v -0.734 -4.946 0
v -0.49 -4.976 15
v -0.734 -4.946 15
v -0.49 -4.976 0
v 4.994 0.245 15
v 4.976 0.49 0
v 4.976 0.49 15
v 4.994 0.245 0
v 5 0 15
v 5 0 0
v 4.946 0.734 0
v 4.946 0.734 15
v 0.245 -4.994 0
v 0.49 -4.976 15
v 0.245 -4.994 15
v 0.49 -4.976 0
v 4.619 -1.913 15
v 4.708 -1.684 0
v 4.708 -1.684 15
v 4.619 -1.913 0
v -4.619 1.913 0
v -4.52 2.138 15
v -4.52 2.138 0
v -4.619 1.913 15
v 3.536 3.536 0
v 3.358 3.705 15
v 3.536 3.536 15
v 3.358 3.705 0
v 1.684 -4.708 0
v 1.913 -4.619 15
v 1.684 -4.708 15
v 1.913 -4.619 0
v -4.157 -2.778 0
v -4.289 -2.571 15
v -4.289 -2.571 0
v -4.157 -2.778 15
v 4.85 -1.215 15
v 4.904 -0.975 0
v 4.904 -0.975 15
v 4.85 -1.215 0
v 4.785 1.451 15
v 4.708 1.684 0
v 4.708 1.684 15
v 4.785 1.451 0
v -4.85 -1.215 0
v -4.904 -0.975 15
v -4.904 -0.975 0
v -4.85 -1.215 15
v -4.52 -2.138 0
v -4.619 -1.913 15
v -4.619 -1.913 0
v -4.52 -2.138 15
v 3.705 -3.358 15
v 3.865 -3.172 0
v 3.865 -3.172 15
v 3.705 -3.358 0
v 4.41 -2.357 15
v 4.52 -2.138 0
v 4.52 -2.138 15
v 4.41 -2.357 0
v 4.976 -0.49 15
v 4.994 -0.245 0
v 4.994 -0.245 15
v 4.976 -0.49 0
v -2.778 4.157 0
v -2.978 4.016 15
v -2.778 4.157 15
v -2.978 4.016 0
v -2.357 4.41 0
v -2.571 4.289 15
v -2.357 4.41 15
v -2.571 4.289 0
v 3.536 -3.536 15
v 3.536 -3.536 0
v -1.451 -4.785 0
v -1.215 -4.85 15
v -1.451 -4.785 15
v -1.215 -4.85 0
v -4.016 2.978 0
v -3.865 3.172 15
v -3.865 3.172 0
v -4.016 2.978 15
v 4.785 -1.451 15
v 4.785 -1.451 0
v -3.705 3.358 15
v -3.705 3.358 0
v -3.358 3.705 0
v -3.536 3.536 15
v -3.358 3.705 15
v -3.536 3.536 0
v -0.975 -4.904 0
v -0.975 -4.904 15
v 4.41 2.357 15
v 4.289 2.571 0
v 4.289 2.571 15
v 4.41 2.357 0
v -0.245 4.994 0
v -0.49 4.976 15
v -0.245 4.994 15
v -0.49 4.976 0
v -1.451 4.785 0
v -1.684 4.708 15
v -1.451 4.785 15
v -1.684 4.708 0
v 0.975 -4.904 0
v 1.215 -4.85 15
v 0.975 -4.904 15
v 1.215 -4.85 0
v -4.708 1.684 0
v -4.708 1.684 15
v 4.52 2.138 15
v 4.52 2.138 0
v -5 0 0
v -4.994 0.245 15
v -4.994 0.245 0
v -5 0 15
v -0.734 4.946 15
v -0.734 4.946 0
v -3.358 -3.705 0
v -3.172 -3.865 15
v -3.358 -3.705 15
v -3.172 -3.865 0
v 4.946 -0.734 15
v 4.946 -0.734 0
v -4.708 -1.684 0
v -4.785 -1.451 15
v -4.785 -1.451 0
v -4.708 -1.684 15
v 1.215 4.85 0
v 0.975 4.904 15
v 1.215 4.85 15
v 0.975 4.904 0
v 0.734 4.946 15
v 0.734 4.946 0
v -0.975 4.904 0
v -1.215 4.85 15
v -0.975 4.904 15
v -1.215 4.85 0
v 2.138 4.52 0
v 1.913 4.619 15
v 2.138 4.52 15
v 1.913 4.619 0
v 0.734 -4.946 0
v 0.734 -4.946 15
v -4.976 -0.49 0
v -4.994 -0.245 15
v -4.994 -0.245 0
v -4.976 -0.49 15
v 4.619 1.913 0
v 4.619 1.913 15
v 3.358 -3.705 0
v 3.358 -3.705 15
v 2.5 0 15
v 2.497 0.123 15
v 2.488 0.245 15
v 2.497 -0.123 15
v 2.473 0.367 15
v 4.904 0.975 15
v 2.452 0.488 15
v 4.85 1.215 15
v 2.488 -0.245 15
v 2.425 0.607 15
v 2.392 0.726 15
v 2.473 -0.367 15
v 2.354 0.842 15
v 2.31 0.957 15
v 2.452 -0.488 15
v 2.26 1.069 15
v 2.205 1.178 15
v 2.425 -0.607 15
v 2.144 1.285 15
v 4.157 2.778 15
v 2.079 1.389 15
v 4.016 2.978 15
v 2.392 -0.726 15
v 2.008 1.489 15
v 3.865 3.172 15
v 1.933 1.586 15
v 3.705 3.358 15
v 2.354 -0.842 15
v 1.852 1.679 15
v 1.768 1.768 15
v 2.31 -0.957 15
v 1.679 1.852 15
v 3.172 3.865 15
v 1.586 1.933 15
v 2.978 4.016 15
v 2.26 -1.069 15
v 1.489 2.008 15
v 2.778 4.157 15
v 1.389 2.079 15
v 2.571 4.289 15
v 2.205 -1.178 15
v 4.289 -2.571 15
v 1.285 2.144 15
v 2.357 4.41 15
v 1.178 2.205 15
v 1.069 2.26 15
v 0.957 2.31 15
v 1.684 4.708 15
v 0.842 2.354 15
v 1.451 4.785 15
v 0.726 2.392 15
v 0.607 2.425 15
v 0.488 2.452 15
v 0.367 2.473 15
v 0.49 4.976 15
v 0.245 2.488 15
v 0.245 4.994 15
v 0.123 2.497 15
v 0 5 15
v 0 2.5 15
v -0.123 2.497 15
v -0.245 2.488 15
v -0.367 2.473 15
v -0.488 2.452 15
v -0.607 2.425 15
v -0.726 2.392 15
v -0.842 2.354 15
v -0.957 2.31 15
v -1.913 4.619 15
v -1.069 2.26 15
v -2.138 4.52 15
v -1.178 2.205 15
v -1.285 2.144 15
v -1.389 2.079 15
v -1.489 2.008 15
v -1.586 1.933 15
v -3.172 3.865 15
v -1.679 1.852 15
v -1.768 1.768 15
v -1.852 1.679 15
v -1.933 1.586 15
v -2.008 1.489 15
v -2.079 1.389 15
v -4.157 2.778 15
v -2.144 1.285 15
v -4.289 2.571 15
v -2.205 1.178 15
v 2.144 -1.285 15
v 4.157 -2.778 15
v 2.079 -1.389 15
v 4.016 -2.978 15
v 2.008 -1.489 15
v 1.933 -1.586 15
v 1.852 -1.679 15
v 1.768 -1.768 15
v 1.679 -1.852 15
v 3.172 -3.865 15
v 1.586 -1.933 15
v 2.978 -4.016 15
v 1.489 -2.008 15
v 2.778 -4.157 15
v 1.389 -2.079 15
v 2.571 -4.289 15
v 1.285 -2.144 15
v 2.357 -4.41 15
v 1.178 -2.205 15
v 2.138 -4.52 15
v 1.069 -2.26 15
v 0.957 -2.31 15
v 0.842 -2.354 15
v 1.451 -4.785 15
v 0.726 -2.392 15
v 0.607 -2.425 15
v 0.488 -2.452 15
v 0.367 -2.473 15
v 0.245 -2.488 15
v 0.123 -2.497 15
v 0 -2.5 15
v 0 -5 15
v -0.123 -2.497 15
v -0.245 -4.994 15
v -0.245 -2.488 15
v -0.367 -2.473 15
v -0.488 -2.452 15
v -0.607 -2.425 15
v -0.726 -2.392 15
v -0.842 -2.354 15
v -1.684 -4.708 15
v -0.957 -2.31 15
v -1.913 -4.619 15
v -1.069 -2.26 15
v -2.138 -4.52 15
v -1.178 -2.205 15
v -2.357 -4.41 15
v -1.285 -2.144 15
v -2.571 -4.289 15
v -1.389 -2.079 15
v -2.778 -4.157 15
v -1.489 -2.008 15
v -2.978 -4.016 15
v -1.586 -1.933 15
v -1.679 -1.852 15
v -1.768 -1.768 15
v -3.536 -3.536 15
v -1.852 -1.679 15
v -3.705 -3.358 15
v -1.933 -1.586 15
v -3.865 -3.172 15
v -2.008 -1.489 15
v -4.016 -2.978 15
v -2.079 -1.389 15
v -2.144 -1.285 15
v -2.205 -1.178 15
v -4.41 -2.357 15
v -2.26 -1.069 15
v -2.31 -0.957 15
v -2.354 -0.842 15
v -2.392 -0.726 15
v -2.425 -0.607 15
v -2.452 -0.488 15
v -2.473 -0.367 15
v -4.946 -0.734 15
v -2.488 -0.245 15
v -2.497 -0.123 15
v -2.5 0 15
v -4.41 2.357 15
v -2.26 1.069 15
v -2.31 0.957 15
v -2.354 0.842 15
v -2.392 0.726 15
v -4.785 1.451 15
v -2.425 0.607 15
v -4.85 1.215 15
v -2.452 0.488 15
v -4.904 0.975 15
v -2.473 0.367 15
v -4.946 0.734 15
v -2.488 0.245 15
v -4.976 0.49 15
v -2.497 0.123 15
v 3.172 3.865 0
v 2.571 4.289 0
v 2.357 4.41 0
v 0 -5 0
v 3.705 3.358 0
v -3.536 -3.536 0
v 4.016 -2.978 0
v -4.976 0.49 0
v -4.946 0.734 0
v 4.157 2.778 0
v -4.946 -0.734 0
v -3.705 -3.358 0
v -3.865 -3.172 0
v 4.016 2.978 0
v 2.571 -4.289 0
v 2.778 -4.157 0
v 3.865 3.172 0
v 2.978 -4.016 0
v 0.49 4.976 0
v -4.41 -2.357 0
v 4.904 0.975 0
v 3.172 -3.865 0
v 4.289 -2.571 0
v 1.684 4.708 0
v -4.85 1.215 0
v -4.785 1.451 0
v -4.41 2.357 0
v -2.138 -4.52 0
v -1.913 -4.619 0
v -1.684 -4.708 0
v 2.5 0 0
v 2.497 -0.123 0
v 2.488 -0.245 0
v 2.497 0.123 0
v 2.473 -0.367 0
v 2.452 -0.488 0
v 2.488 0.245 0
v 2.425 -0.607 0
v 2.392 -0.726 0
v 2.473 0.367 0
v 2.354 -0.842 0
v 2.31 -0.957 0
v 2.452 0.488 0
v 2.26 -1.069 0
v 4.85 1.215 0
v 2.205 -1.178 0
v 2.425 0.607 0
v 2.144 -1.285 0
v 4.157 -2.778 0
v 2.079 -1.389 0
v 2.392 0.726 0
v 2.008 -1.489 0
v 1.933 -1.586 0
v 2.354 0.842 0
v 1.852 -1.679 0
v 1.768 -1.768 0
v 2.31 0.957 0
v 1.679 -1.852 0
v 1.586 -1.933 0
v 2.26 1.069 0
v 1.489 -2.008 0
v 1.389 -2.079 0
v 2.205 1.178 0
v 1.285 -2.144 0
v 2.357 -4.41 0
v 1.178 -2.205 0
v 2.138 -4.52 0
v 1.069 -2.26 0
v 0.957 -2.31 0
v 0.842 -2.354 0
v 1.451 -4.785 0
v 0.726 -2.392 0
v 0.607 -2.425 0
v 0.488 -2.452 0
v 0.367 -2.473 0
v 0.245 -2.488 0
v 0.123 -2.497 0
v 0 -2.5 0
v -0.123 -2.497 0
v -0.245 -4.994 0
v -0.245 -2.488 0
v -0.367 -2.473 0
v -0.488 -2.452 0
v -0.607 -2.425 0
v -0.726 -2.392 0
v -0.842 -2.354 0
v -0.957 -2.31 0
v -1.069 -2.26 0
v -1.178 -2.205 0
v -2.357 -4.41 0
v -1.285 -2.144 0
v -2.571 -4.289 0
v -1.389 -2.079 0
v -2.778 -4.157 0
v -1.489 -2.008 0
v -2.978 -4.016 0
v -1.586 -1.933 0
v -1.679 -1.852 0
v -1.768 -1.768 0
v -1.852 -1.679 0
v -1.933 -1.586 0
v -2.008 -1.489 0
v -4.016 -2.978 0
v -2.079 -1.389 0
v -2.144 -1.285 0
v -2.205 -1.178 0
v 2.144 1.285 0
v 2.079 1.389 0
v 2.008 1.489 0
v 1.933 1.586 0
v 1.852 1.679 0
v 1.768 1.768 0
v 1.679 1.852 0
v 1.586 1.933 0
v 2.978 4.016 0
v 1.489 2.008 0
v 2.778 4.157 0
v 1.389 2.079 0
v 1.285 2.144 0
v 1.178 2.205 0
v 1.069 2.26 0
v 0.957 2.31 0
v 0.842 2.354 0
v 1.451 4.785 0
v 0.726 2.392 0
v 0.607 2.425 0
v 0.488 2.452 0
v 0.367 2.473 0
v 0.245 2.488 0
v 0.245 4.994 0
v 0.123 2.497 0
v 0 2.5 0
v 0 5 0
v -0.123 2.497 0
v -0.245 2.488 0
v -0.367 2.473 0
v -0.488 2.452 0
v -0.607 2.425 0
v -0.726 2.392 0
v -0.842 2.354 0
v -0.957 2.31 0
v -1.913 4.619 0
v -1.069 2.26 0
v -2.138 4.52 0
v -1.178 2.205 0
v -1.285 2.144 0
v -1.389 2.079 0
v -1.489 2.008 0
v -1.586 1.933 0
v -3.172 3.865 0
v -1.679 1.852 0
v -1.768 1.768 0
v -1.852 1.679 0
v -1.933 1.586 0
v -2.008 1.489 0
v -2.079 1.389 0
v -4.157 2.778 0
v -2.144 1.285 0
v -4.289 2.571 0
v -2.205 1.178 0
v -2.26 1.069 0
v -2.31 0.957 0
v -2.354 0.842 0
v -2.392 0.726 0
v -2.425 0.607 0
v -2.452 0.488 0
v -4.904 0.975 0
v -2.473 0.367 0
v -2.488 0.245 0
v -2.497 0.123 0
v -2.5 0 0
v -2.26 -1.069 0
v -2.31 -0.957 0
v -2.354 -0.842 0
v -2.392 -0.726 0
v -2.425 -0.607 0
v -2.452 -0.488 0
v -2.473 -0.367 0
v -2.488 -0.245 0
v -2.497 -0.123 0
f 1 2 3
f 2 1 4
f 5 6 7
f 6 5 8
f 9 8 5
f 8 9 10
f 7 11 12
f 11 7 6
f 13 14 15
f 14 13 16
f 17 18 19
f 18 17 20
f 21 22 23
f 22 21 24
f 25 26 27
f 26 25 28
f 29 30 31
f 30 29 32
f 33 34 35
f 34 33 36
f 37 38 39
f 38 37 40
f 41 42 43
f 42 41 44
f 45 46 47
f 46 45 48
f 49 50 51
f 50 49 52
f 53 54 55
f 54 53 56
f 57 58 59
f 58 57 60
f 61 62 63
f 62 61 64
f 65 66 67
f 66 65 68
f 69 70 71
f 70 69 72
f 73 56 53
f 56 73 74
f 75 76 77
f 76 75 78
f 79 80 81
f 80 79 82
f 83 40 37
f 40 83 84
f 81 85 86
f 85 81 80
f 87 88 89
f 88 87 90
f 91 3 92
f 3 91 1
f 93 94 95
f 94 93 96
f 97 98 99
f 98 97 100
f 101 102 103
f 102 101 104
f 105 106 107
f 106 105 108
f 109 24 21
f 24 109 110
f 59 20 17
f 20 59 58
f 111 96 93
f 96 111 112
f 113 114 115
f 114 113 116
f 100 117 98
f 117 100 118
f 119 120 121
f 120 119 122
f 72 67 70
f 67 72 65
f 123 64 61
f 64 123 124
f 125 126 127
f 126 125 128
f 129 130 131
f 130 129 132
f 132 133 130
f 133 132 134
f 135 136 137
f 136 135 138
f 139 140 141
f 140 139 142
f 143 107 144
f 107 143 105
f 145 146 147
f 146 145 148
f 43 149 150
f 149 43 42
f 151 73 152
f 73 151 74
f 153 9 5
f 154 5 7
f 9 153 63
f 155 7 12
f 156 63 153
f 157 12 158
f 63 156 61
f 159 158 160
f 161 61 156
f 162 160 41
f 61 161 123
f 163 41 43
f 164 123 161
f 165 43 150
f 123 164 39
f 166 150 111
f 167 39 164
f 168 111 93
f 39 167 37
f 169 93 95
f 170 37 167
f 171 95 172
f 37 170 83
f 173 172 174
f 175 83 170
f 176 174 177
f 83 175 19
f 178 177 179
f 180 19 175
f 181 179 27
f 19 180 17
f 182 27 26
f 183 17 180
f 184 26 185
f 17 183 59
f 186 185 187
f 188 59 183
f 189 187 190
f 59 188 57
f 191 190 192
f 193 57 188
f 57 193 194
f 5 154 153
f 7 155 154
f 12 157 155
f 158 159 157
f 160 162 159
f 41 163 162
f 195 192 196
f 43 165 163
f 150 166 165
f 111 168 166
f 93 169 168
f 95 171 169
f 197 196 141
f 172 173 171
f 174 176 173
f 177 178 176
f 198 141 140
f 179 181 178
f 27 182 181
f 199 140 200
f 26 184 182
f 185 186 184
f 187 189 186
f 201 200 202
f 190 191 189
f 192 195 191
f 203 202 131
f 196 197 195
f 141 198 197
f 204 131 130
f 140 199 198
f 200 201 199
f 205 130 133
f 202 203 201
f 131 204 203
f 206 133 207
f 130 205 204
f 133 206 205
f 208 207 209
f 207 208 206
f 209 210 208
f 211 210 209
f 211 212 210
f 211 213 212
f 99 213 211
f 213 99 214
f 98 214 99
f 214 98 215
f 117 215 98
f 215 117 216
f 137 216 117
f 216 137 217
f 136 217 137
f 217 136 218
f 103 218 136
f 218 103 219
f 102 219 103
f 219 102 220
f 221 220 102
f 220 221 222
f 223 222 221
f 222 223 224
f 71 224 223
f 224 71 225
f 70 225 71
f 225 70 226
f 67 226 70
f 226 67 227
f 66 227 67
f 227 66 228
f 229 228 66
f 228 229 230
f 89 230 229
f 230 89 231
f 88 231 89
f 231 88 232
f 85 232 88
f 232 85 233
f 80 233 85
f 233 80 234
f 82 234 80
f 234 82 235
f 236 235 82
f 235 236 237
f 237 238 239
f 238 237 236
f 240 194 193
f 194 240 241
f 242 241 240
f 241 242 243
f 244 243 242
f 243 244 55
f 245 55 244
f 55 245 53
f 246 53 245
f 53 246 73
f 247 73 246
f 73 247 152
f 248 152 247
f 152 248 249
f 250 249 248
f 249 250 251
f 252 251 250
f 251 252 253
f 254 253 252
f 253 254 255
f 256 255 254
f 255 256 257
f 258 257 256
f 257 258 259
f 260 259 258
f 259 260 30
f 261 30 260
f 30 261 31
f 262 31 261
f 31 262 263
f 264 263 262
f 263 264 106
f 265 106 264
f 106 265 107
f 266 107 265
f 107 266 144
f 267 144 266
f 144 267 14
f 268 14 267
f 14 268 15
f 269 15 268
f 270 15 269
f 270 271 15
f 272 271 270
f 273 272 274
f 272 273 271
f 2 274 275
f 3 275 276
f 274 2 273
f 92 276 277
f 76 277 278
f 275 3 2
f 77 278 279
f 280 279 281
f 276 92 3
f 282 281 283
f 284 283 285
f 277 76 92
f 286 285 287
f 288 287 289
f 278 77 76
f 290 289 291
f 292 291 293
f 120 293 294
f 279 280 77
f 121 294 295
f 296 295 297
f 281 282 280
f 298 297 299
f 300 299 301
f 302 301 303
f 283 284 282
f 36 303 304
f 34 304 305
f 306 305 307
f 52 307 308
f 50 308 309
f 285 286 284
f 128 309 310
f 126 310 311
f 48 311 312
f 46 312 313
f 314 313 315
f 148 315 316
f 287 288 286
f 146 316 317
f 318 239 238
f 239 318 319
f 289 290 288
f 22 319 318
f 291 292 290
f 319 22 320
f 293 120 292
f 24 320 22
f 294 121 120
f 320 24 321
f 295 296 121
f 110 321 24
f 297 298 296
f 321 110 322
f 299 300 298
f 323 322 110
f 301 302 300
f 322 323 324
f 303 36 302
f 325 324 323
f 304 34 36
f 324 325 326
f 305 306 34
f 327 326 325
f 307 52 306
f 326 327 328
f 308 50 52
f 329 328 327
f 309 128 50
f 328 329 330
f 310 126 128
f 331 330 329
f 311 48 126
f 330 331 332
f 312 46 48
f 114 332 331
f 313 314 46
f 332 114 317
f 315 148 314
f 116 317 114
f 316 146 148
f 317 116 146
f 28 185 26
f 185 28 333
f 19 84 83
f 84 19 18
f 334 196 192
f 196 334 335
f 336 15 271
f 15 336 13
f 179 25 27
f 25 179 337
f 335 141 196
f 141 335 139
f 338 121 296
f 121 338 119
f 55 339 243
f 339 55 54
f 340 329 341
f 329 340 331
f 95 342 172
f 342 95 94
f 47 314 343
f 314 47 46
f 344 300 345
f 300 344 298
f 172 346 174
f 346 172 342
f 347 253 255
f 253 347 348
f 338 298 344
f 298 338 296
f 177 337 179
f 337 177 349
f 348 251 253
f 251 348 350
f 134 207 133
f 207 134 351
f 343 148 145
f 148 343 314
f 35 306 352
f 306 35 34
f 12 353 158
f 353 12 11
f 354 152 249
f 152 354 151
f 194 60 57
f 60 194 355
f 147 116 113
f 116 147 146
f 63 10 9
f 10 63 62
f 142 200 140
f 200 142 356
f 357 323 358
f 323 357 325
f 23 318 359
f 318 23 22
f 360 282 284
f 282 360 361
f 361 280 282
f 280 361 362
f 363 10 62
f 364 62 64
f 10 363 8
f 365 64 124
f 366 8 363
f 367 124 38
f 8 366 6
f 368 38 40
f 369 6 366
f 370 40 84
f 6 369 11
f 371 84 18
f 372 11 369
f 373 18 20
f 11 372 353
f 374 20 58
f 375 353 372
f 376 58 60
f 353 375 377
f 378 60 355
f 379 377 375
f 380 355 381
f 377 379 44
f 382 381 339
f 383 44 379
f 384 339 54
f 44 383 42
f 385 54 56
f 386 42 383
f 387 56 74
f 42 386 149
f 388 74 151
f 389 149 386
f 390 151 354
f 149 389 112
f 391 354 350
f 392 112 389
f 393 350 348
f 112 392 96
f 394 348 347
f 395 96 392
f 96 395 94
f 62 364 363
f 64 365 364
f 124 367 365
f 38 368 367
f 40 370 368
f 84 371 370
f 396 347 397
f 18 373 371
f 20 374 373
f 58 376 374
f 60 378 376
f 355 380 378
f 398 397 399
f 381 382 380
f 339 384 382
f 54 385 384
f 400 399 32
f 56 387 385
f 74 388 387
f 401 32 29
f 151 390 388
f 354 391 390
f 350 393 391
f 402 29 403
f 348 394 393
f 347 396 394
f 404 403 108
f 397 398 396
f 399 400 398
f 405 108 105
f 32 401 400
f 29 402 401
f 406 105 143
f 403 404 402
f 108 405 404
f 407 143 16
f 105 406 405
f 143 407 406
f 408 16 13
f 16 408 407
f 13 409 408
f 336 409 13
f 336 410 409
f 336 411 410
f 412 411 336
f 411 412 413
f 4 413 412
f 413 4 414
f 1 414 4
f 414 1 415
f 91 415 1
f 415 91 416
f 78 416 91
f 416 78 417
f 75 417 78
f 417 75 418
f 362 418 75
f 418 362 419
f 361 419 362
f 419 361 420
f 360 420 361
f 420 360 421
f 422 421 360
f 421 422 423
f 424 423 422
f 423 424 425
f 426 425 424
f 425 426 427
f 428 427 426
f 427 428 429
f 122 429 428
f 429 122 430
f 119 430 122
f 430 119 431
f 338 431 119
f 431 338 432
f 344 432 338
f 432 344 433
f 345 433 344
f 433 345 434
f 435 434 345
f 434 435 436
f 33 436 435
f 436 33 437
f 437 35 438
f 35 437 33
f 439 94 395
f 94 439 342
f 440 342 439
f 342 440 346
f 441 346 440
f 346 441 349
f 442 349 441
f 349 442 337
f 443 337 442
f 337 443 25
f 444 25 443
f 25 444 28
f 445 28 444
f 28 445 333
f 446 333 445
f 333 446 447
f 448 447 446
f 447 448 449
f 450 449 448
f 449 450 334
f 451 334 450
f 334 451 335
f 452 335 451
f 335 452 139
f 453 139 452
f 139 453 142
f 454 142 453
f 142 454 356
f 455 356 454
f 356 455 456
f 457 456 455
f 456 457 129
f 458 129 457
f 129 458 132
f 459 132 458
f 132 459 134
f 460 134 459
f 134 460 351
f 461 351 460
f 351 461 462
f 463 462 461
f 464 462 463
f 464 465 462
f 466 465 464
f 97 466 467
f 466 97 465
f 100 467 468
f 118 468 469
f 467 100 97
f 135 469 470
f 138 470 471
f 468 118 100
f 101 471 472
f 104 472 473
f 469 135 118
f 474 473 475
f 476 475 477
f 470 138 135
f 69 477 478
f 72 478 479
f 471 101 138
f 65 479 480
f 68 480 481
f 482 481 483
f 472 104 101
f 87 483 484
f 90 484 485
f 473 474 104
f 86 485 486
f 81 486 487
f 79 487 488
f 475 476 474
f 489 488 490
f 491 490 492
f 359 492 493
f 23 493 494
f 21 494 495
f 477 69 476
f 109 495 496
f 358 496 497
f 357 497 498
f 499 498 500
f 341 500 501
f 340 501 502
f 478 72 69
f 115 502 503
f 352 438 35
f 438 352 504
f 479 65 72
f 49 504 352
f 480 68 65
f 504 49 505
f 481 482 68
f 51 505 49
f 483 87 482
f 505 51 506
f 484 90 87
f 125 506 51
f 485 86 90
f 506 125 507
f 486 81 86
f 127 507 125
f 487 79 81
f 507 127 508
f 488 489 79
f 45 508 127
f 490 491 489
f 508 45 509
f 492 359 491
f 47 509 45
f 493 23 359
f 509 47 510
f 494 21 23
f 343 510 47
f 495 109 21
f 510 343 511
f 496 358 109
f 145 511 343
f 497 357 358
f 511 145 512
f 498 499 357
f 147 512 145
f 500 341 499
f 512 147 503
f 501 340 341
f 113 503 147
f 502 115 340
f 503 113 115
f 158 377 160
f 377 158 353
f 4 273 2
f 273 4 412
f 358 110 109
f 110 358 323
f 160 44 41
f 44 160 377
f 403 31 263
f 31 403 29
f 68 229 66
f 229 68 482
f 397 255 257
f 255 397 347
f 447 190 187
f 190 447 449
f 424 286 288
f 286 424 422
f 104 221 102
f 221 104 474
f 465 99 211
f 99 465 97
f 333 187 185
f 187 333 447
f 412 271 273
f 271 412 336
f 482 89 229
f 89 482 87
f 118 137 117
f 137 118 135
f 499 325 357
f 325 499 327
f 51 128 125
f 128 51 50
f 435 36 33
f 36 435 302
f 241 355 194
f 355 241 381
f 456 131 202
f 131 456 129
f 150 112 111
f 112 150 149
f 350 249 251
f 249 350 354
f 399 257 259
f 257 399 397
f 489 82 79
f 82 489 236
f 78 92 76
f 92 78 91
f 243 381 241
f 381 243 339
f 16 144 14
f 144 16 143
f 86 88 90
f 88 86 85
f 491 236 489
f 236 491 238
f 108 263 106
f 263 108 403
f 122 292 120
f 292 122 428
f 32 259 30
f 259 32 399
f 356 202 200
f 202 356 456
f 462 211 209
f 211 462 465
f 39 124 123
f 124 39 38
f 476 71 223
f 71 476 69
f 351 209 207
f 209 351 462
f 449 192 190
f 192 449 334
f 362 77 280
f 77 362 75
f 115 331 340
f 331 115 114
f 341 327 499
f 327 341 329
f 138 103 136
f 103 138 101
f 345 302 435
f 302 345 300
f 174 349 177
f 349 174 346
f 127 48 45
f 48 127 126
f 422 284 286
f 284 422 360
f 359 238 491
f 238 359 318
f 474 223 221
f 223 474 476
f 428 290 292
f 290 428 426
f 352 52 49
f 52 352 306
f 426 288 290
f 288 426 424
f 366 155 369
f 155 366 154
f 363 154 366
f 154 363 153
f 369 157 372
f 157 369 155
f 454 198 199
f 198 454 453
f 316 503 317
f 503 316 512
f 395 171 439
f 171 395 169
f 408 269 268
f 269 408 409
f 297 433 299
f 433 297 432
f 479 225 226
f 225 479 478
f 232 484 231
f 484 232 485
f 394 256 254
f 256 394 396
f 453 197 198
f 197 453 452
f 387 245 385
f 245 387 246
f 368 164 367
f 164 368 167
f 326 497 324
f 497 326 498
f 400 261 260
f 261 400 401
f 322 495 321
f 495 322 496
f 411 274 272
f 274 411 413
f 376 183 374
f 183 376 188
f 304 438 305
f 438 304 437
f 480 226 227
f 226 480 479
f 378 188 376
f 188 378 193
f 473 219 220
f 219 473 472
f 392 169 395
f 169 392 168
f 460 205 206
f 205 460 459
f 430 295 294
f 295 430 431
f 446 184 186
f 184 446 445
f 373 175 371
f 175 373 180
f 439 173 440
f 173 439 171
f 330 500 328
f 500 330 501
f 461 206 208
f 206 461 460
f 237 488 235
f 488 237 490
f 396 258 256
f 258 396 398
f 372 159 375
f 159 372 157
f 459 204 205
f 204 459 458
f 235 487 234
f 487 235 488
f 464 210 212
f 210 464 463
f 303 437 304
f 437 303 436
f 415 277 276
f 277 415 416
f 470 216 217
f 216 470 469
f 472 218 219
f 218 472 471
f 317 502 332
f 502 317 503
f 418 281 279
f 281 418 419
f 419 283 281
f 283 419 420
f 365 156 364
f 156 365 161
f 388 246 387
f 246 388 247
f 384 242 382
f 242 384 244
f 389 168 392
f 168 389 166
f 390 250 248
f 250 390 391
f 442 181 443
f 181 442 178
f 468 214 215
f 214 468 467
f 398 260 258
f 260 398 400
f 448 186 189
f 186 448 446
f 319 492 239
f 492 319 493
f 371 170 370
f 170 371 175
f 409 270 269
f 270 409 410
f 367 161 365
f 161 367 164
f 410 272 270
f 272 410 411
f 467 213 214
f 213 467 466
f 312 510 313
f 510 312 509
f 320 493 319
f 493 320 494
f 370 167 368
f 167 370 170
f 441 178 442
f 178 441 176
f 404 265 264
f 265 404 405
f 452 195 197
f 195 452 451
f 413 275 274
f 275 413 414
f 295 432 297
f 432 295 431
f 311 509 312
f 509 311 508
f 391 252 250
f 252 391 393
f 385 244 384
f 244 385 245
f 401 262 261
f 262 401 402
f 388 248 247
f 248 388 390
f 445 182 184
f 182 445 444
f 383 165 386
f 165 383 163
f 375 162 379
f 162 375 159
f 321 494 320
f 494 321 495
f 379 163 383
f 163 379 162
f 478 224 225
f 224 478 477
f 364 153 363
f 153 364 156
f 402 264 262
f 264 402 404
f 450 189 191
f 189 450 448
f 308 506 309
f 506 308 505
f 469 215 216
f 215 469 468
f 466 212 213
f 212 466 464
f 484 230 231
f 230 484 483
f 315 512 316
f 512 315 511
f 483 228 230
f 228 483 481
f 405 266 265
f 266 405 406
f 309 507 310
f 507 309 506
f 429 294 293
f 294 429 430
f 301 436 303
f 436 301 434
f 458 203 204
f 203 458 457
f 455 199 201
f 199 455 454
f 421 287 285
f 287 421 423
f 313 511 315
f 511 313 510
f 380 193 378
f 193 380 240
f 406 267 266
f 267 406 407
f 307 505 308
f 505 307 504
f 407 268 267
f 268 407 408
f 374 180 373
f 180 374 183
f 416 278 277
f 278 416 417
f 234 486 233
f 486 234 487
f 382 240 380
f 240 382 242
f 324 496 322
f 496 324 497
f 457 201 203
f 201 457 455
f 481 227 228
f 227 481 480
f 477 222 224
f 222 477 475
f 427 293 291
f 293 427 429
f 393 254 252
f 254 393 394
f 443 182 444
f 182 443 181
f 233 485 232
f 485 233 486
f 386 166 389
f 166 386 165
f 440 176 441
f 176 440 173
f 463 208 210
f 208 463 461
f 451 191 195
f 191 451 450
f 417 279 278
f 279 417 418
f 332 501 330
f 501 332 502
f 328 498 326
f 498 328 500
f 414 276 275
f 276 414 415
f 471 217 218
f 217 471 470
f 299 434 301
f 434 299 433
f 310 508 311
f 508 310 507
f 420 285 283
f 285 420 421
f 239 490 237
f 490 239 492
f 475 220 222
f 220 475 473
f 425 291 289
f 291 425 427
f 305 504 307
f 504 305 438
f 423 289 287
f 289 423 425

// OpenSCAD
$fn = 128;

bore_d = 5.0;
outer_d = 10.0;
length = 15.0;

difference() {
  cylinder(d = outer_d, h = length, center = false);
  translate([0, 0, -0.1])
    cylinder(d = bore_d, h = length + 0.2, center = false);
}
